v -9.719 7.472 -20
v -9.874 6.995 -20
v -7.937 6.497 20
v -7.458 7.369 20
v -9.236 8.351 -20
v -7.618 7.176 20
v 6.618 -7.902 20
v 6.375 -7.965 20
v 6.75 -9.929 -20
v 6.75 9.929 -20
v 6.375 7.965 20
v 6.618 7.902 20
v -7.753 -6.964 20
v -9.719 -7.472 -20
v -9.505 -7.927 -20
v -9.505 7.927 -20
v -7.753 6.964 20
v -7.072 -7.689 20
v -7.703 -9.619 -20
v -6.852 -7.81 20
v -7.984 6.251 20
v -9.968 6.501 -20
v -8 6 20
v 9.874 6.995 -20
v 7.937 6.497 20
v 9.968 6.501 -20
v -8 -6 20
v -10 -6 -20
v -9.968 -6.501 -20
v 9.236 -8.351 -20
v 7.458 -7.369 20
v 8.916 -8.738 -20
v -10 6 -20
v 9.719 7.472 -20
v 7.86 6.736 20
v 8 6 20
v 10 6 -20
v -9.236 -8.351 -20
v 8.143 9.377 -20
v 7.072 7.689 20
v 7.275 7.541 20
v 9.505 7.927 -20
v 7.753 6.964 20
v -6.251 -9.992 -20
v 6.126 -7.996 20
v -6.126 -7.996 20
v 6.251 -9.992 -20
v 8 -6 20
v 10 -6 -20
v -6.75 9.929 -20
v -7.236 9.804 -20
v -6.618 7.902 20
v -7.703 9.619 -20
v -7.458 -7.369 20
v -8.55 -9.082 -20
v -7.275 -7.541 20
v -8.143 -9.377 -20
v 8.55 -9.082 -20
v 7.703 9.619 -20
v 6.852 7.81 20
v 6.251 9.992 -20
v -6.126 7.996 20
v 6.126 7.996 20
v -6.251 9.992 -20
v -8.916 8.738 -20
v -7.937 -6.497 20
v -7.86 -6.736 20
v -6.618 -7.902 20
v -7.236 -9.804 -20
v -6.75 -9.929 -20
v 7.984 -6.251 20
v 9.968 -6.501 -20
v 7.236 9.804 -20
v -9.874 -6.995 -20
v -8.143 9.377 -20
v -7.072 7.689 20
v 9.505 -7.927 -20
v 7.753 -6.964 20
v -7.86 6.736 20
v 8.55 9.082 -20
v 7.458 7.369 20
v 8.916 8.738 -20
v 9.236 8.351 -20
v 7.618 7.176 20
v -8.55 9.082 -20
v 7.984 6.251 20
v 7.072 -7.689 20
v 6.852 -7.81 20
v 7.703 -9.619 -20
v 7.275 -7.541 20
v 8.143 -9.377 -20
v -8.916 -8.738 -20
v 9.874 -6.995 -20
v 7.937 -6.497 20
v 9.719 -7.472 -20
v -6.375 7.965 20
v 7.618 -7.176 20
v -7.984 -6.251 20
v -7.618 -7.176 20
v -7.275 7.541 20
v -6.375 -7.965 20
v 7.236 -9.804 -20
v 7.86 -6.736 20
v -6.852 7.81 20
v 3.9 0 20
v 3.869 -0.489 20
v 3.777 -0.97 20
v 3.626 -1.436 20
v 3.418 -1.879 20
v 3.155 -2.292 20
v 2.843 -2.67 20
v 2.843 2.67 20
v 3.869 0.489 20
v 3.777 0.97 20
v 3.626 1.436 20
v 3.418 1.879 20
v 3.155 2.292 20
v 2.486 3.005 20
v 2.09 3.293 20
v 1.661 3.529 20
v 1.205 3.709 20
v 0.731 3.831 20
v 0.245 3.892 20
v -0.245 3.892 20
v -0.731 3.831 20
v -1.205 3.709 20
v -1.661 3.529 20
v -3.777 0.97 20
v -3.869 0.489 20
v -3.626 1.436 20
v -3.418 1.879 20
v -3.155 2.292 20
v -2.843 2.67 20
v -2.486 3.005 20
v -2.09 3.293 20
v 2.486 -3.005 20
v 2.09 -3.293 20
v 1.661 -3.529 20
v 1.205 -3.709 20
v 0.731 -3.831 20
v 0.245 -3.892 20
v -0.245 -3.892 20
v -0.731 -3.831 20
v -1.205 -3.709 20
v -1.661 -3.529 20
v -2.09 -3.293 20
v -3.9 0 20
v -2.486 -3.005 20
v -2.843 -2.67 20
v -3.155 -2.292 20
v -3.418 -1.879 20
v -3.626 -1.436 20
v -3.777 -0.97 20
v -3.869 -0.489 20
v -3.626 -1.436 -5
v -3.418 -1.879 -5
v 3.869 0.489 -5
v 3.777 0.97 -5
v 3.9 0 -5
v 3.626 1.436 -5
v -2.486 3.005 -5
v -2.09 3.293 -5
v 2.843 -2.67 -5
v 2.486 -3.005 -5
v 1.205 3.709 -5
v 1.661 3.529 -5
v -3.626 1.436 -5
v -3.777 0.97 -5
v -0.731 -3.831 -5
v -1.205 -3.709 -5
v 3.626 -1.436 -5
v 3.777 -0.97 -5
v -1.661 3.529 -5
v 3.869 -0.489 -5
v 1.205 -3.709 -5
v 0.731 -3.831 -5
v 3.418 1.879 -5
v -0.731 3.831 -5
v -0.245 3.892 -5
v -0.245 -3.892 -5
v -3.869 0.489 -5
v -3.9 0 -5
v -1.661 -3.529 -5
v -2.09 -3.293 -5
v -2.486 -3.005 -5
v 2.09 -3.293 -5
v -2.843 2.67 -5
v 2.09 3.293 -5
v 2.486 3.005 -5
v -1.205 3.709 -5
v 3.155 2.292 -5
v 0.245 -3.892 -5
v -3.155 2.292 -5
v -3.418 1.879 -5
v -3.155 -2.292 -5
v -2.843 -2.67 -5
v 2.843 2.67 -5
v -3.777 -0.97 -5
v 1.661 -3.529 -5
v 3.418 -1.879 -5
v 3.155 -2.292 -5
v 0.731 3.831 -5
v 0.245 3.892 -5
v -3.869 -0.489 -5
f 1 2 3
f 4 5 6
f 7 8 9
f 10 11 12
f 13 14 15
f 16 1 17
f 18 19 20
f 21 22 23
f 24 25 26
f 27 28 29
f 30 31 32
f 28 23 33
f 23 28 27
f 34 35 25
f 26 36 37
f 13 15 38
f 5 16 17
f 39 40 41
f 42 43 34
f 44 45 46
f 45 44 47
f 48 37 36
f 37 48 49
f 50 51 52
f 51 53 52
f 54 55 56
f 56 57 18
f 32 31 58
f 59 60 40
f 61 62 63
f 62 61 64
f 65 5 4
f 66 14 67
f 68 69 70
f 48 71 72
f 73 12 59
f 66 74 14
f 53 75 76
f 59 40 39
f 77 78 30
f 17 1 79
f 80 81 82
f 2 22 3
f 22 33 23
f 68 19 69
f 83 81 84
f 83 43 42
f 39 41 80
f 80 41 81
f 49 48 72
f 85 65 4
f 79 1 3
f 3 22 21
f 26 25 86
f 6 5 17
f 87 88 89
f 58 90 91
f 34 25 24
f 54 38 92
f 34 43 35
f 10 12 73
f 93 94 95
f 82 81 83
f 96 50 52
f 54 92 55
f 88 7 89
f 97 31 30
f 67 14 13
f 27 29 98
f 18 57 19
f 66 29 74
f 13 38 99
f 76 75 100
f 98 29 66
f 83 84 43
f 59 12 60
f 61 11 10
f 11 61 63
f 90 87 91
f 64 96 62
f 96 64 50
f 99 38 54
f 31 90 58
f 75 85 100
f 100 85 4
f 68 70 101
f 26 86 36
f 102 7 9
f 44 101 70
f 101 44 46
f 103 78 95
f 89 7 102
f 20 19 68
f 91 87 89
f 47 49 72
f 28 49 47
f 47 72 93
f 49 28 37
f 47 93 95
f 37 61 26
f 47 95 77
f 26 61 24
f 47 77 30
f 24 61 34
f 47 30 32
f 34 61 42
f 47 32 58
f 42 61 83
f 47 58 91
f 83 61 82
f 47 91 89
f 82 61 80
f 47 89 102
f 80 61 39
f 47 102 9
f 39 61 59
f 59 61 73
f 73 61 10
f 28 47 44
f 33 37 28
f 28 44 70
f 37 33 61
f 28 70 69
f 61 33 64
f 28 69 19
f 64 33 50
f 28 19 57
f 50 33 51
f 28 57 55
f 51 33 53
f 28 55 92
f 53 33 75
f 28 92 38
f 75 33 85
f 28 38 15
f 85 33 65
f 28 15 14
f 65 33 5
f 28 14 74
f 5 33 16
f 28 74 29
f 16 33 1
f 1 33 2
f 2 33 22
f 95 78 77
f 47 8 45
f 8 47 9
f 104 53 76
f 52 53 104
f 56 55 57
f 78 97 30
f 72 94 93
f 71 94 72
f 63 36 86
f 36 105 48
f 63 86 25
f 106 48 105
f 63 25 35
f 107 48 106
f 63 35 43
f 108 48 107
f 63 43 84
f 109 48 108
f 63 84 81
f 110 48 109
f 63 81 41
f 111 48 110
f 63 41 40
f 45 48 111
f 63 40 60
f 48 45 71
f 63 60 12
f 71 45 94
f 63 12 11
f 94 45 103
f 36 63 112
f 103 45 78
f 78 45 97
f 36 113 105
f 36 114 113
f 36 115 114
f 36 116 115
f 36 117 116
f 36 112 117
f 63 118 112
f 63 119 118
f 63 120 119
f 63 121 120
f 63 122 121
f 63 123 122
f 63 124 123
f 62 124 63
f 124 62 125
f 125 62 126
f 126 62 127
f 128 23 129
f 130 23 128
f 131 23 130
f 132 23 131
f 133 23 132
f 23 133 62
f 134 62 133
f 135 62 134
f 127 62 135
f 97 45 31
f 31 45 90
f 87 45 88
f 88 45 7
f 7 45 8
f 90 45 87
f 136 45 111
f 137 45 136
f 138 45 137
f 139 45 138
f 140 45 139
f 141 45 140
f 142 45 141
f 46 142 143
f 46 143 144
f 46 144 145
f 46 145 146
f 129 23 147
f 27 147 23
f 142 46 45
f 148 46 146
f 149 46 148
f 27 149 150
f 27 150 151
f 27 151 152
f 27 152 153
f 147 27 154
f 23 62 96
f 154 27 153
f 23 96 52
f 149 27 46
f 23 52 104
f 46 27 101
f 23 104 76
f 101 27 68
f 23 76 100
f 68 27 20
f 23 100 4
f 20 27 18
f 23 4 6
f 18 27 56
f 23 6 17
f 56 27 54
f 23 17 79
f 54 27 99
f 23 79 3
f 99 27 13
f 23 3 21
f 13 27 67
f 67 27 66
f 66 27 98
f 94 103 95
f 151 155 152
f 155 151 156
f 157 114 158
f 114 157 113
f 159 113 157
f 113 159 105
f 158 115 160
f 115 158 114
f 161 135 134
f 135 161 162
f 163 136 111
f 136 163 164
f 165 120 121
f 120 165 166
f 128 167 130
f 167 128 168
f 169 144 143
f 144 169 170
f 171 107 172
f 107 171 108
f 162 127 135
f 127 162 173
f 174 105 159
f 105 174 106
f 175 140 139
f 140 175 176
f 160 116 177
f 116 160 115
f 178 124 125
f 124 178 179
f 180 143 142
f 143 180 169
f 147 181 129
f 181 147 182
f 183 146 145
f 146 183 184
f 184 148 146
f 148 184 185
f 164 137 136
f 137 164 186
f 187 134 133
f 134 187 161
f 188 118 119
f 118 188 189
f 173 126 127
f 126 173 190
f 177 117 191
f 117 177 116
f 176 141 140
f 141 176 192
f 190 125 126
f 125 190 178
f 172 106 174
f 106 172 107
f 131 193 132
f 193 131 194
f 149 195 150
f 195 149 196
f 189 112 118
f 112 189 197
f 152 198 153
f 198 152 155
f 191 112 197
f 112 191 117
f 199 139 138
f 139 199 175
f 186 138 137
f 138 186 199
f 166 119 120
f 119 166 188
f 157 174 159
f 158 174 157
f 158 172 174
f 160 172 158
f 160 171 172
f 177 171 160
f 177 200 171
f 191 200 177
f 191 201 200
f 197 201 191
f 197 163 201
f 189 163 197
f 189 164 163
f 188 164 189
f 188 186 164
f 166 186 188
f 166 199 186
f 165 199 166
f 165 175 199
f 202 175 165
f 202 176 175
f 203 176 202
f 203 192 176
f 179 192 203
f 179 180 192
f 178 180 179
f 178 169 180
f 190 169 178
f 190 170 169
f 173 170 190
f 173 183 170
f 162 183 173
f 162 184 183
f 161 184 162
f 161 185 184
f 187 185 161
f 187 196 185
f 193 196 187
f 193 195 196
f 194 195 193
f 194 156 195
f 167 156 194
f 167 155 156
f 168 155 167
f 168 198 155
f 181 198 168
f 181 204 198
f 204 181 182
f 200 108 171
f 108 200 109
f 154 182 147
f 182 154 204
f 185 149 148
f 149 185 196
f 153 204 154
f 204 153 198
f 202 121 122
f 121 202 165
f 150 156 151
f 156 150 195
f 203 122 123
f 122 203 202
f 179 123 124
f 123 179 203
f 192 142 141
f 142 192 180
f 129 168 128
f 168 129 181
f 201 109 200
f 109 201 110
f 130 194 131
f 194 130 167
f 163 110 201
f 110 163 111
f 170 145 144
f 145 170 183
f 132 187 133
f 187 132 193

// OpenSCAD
use <MCAD/triangles.scad>

x = 20;
y = x;
z = 40;
rad = 4; 
radInt = 3.9;
wallThick = 4;
screwHead = 10;
screwD = 5;


difference() {
    hull() {
        translate([-x/2+rad, y/2-rad,-z/2]) cylinder(h=z,r1=rad, r2=rad/2, $fn=50);
        translate([ x/2-rad, y/2-rad,-z/2]) cylinder(h=z,r1=rad, r2=rad/2, $fn=50);
        translate([-x/2+rad,-y/2+rad,-z/2]) cylinder(h=z,r1=rad, r2=rad/2, $fn=50);
        translate([ x/2-rad,-y/2+rad,-z/2]) cylinder(h=z,r1=rad, r2=rad/2, $fn=50);
   }
        
   #translate([0,0, -5]) cylinder(h=2*z,r=radInt, $fn=50);
};

module roundedBox(x,y,z,rad){
	hull() {
        translate([-x/2+rad, y/2-rad,-z/2]) cylinder(h=z,r=rad, $fn=50);
        translate([ x/2-rad, y/2-rad,-z/2]) cylinder(h=z,r=rad, $fn=50);
        translate([-x/2+rad,-y/2+rad,-z/2]) cylinder(h=z,r=rad, $fn=50);
        translate([ x/2-rad,-y/2+rad,-z/2]) cylinder(h=z,r=rad, $fn=50);
   }
}
